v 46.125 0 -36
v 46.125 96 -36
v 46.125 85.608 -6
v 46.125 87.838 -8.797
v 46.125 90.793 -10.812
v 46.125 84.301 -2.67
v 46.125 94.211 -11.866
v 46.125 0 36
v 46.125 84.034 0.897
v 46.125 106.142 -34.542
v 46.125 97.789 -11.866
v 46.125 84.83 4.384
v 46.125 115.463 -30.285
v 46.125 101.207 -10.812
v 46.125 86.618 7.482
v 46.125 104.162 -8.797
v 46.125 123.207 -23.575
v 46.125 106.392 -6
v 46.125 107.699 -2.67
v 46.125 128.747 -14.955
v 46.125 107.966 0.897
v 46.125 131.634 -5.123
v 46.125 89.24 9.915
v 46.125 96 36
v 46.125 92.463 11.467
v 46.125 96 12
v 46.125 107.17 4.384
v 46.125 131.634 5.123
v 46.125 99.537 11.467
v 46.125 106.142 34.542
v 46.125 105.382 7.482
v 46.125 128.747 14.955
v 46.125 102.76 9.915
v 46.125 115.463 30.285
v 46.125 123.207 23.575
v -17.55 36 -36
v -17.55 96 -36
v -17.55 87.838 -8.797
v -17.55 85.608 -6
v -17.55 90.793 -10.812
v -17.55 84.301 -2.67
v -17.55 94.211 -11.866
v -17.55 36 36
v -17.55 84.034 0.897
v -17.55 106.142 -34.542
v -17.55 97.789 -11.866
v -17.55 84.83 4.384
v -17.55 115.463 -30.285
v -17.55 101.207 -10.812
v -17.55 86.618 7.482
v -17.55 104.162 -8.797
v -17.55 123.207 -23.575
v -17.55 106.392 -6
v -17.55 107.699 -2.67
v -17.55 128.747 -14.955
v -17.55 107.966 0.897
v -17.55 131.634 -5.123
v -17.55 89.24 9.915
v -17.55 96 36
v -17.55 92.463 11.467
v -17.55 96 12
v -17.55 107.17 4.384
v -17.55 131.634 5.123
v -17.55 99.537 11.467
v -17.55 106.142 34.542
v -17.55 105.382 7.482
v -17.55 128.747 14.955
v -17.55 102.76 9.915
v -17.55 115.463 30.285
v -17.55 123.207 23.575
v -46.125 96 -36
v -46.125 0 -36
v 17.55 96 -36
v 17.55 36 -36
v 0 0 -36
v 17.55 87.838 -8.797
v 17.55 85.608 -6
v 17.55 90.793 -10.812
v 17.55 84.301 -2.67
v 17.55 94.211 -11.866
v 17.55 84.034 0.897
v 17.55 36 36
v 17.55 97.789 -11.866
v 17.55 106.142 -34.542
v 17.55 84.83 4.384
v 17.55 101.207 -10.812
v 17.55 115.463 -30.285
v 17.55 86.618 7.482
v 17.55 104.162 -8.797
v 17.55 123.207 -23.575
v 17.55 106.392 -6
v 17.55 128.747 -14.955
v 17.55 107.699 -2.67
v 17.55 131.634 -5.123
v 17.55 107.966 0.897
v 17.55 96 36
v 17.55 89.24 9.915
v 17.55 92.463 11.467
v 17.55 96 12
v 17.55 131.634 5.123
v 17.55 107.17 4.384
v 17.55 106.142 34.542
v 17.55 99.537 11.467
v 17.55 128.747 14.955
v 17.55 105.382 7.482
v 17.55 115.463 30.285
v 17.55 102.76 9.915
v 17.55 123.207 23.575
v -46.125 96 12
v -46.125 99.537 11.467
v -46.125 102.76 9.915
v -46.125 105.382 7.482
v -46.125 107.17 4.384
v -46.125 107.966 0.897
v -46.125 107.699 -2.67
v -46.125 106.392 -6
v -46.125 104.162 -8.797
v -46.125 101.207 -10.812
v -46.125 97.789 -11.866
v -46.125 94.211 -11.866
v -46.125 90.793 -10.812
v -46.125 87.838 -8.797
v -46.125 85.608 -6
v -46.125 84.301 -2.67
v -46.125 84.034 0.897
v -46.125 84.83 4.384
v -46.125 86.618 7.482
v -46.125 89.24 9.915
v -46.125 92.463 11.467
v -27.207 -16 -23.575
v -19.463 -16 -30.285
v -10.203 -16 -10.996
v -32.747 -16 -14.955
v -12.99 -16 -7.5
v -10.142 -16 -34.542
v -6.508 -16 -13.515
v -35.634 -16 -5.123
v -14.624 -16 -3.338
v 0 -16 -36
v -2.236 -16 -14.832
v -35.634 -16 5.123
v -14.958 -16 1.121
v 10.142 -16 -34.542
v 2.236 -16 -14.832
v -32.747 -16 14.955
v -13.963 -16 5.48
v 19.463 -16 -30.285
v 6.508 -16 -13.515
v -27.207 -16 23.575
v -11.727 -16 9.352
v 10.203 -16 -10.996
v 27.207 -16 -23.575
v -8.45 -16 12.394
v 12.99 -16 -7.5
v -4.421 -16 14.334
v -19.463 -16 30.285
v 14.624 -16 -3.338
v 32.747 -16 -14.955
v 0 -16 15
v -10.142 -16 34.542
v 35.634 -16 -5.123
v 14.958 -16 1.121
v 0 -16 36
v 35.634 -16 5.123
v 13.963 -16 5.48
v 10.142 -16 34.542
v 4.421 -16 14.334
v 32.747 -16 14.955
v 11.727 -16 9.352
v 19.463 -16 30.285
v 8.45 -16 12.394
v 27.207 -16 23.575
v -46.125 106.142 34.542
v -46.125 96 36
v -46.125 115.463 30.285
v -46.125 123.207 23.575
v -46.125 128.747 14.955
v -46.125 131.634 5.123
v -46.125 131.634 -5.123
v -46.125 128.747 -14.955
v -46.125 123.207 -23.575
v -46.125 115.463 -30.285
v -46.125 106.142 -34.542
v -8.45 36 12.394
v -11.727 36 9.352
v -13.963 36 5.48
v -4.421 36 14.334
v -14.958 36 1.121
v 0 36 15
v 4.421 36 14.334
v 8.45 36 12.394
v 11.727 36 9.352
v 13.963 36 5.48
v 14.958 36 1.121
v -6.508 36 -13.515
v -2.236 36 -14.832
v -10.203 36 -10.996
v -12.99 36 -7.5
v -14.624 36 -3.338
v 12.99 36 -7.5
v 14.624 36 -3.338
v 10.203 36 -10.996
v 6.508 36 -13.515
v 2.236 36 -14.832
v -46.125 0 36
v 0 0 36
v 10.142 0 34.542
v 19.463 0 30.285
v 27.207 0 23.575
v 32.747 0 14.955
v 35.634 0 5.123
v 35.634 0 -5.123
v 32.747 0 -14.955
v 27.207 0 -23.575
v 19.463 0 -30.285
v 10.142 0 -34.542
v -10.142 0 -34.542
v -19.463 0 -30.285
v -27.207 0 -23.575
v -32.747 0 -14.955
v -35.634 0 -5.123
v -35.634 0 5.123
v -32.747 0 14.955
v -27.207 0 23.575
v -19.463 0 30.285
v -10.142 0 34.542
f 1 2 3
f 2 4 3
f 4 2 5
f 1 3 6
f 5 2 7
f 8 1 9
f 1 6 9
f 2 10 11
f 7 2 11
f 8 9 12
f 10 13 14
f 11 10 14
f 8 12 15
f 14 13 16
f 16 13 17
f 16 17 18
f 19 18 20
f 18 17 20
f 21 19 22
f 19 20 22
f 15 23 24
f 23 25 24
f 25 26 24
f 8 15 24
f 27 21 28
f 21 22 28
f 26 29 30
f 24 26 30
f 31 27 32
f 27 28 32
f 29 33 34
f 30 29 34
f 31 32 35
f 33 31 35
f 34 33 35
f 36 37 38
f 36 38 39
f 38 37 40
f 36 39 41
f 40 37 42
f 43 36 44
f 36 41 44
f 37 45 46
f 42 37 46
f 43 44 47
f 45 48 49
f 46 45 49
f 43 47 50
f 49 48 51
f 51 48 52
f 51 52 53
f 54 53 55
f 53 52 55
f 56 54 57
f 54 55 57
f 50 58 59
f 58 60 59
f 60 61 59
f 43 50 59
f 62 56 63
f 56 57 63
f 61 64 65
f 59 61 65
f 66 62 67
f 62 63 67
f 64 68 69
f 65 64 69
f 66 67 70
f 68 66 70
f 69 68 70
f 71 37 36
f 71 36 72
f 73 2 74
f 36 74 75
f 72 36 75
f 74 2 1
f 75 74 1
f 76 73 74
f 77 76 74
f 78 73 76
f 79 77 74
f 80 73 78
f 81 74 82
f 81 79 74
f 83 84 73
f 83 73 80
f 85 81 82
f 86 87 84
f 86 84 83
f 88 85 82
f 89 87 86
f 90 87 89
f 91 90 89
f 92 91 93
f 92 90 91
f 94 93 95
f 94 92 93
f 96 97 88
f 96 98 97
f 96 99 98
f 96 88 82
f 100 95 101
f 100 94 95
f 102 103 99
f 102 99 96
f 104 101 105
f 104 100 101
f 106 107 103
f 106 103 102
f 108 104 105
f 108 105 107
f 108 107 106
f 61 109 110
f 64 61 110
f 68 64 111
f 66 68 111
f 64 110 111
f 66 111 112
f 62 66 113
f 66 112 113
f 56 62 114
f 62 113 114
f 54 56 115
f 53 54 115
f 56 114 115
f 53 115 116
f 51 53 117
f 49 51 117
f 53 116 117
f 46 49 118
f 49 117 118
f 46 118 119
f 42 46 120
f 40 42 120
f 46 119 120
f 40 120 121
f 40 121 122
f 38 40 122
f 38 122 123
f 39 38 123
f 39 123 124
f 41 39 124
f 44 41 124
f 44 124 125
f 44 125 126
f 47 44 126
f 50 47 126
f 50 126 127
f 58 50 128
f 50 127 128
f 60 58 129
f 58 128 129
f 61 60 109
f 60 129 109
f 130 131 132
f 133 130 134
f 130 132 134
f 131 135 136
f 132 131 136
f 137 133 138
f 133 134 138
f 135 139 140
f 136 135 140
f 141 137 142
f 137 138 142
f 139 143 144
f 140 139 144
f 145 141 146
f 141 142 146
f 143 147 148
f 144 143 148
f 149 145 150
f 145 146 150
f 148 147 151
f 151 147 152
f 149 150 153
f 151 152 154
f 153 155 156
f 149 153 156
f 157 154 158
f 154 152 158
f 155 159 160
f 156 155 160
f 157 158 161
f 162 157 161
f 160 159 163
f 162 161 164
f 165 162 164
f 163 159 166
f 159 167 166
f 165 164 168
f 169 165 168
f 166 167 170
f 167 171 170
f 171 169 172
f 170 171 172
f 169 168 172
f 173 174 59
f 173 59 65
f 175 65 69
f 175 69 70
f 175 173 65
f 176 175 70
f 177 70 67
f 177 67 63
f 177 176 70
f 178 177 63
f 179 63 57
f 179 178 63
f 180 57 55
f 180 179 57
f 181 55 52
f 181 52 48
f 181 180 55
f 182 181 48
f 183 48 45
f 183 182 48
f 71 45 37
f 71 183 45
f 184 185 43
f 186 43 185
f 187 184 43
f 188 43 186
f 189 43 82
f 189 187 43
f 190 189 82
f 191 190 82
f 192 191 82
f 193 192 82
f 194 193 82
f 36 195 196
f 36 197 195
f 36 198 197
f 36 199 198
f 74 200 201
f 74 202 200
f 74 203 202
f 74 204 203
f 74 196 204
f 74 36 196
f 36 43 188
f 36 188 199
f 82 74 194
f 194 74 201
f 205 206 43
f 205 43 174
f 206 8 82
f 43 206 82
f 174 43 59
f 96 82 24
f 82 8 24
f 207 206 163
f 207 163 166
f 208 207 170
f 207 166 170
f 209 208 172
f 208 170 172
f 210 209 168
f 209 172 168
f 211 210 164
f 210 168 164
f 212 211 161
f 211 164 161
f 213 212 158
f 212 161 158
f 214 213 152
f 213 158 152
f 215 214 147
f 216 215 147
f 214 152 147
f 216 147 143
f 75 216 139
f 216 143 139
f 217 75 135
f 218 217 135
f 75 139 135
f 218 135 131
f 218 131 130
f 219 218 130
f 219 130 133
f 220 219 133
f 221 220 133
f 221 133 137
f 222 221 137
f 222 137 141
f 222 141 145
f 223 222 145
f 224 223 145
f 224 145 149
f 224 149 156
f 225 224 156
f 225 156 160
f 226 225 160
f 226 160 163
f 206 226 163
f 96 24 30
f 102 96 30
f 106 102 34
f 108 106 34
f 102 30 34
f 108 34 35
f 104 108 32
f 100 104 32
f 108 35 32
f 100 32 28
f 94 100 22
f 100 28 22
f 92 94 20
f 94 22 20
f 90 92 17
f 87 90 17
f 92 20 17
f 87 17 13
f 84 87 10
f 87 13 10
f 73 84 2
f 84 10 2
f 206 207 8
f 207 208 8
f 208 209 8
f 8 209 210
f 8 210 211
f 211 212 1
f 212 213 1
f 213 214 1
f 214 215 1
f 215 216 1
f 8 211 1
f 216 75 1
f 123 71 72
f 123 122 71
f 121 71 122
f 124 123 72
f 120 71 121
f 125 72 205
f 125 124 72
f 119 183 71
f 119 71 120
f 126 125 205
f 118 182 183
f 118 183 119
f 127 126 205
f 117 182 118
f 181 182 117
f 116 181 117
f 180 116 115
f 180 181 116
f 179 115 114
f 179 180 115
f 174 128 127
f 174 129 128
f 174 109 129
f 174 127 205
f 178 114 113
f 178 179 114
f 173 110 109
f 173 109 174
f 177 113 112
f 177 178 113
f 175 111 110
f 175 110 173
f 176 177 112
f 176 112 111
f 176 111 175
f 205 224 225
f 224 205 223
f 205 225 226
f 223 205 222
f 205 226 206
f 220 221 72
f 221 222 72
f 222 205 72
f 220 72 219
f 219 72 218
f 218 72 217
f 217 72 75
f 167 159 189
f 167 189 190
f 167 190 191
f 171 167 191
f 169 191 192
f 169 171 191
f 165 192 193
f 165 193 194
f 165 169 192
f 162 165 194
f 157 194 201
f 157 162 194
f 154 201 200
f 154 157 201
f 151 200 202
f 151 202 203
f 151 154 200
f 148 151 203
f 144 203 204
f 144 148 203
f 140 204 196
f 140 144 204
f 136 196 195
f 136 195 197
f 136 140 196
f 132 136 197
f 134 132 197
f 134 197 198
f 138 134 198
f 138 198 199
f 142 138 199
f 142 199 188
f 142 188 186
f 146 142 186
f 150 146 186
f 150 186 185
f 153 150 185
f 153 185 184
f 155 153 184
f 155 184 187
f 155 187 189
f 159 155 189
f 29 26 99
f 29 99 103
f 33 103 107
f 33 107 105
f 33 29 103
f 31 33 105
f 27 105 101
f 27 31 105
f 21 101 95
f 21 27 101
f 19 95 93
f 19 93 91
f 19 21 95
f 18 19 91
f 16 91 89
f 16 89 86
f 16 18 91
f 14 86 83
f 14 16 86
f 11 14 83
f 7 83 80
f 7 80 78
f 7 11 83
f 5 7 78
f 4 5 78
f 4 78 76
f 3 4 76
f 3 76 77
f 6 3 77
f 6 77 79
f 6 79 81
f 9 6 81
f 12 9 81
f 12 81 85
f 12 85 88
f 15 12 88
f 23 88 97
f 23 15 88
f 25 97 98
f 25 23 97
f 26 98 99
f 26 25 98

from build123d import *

# Parameters (mm, degrees)
SKETCH1_W           = 92.25
SKETCH1_H           = 72
SKETCH1_R           = 15
BOSS_EXTRUDE1_DEPTH = 36
BOSS_EXTRUDE2_START = -16
SKETCH1_3_R         = 15
BOSS_EXTRUDE2_DEPTH = 16
SKETCH2_R           = 12
BOSS_EXTRUDE3_DEPTH = 28.575


with BuildPart() as part:
    # Sketch1 → Boss-Extrude1 (new body)
    with BuildSketch(Plane(origin=(0, 0, 0), x_dir=(1, 0, 0), z_dir=(0, 1, 0))):
        Rectangle(SKETCH1_W, SKETCH1_H)
        Circle(SKETCH1_R, mode=Mode.SUBTRACT)
    boss_extrude1 = extrude(amount=BOSS_EXTRUDE1_DEPTH)

    # Sketch1<3> → Boss-Extrude2 (add)
    with BuildSketch(Plane(origin=(0, 0, 0), x_dir=(1, 0, 0), z_dir=(0, 1, 0)).offset(BOSS_EXTRUDE2_START)):
        with BuildLine():
            ThreePointArc((36, 0), (25.455844112, 25.455844134), (-3.1e-08, 36))
            ThreePointArc((-3.1e-08, 36), (-36, -3.6e-08), (4.1e-08, -36))
            ThreePointArc((4.1e-08, -36), (25.455844137, -25.455844108), (36, 0))
        make_face()
        Circle(SKETCH1_3_R, mode=Mode.SUBTRACT)
    extrude(amount=BOSS_EXTRUDE2_DEPTH)

    # Sketch2 → Boss-Extrude3 (add)
    with BuildSketch(Plane.ZY.offset(46.125)):
        with BuildLine():
            Line((-36, 36), (36, 36))
            Line((36, 36), (36, 96))
            ThreePointArc((36, 96), (0, 132), (-36, 96))
            Line((-36, 96), (-36, 36))
        make_face()
        with Locations((0, 96)):
            Circle(SKETCH2_R, mode=Mode.SUBTRACT)
    boss_extrude3 = extrude(amount=-BOSS_EXTRUDE3_DEPTH)

    # Mirror1: Boss-Extrude1, Boss-Extrude3 across plane
    add(boss_extrude1.mirror(Plane(origin=(0, 0, 0), x_dir=(0, 0, 1), z_dir=(1, 0, 0))))
    add(boss_extrude3.mirror(Plane(origin=(0, 0, 0), x_dir=(0, 0, 1), z_dir=(1, 0, 0))))


solid = part.part
